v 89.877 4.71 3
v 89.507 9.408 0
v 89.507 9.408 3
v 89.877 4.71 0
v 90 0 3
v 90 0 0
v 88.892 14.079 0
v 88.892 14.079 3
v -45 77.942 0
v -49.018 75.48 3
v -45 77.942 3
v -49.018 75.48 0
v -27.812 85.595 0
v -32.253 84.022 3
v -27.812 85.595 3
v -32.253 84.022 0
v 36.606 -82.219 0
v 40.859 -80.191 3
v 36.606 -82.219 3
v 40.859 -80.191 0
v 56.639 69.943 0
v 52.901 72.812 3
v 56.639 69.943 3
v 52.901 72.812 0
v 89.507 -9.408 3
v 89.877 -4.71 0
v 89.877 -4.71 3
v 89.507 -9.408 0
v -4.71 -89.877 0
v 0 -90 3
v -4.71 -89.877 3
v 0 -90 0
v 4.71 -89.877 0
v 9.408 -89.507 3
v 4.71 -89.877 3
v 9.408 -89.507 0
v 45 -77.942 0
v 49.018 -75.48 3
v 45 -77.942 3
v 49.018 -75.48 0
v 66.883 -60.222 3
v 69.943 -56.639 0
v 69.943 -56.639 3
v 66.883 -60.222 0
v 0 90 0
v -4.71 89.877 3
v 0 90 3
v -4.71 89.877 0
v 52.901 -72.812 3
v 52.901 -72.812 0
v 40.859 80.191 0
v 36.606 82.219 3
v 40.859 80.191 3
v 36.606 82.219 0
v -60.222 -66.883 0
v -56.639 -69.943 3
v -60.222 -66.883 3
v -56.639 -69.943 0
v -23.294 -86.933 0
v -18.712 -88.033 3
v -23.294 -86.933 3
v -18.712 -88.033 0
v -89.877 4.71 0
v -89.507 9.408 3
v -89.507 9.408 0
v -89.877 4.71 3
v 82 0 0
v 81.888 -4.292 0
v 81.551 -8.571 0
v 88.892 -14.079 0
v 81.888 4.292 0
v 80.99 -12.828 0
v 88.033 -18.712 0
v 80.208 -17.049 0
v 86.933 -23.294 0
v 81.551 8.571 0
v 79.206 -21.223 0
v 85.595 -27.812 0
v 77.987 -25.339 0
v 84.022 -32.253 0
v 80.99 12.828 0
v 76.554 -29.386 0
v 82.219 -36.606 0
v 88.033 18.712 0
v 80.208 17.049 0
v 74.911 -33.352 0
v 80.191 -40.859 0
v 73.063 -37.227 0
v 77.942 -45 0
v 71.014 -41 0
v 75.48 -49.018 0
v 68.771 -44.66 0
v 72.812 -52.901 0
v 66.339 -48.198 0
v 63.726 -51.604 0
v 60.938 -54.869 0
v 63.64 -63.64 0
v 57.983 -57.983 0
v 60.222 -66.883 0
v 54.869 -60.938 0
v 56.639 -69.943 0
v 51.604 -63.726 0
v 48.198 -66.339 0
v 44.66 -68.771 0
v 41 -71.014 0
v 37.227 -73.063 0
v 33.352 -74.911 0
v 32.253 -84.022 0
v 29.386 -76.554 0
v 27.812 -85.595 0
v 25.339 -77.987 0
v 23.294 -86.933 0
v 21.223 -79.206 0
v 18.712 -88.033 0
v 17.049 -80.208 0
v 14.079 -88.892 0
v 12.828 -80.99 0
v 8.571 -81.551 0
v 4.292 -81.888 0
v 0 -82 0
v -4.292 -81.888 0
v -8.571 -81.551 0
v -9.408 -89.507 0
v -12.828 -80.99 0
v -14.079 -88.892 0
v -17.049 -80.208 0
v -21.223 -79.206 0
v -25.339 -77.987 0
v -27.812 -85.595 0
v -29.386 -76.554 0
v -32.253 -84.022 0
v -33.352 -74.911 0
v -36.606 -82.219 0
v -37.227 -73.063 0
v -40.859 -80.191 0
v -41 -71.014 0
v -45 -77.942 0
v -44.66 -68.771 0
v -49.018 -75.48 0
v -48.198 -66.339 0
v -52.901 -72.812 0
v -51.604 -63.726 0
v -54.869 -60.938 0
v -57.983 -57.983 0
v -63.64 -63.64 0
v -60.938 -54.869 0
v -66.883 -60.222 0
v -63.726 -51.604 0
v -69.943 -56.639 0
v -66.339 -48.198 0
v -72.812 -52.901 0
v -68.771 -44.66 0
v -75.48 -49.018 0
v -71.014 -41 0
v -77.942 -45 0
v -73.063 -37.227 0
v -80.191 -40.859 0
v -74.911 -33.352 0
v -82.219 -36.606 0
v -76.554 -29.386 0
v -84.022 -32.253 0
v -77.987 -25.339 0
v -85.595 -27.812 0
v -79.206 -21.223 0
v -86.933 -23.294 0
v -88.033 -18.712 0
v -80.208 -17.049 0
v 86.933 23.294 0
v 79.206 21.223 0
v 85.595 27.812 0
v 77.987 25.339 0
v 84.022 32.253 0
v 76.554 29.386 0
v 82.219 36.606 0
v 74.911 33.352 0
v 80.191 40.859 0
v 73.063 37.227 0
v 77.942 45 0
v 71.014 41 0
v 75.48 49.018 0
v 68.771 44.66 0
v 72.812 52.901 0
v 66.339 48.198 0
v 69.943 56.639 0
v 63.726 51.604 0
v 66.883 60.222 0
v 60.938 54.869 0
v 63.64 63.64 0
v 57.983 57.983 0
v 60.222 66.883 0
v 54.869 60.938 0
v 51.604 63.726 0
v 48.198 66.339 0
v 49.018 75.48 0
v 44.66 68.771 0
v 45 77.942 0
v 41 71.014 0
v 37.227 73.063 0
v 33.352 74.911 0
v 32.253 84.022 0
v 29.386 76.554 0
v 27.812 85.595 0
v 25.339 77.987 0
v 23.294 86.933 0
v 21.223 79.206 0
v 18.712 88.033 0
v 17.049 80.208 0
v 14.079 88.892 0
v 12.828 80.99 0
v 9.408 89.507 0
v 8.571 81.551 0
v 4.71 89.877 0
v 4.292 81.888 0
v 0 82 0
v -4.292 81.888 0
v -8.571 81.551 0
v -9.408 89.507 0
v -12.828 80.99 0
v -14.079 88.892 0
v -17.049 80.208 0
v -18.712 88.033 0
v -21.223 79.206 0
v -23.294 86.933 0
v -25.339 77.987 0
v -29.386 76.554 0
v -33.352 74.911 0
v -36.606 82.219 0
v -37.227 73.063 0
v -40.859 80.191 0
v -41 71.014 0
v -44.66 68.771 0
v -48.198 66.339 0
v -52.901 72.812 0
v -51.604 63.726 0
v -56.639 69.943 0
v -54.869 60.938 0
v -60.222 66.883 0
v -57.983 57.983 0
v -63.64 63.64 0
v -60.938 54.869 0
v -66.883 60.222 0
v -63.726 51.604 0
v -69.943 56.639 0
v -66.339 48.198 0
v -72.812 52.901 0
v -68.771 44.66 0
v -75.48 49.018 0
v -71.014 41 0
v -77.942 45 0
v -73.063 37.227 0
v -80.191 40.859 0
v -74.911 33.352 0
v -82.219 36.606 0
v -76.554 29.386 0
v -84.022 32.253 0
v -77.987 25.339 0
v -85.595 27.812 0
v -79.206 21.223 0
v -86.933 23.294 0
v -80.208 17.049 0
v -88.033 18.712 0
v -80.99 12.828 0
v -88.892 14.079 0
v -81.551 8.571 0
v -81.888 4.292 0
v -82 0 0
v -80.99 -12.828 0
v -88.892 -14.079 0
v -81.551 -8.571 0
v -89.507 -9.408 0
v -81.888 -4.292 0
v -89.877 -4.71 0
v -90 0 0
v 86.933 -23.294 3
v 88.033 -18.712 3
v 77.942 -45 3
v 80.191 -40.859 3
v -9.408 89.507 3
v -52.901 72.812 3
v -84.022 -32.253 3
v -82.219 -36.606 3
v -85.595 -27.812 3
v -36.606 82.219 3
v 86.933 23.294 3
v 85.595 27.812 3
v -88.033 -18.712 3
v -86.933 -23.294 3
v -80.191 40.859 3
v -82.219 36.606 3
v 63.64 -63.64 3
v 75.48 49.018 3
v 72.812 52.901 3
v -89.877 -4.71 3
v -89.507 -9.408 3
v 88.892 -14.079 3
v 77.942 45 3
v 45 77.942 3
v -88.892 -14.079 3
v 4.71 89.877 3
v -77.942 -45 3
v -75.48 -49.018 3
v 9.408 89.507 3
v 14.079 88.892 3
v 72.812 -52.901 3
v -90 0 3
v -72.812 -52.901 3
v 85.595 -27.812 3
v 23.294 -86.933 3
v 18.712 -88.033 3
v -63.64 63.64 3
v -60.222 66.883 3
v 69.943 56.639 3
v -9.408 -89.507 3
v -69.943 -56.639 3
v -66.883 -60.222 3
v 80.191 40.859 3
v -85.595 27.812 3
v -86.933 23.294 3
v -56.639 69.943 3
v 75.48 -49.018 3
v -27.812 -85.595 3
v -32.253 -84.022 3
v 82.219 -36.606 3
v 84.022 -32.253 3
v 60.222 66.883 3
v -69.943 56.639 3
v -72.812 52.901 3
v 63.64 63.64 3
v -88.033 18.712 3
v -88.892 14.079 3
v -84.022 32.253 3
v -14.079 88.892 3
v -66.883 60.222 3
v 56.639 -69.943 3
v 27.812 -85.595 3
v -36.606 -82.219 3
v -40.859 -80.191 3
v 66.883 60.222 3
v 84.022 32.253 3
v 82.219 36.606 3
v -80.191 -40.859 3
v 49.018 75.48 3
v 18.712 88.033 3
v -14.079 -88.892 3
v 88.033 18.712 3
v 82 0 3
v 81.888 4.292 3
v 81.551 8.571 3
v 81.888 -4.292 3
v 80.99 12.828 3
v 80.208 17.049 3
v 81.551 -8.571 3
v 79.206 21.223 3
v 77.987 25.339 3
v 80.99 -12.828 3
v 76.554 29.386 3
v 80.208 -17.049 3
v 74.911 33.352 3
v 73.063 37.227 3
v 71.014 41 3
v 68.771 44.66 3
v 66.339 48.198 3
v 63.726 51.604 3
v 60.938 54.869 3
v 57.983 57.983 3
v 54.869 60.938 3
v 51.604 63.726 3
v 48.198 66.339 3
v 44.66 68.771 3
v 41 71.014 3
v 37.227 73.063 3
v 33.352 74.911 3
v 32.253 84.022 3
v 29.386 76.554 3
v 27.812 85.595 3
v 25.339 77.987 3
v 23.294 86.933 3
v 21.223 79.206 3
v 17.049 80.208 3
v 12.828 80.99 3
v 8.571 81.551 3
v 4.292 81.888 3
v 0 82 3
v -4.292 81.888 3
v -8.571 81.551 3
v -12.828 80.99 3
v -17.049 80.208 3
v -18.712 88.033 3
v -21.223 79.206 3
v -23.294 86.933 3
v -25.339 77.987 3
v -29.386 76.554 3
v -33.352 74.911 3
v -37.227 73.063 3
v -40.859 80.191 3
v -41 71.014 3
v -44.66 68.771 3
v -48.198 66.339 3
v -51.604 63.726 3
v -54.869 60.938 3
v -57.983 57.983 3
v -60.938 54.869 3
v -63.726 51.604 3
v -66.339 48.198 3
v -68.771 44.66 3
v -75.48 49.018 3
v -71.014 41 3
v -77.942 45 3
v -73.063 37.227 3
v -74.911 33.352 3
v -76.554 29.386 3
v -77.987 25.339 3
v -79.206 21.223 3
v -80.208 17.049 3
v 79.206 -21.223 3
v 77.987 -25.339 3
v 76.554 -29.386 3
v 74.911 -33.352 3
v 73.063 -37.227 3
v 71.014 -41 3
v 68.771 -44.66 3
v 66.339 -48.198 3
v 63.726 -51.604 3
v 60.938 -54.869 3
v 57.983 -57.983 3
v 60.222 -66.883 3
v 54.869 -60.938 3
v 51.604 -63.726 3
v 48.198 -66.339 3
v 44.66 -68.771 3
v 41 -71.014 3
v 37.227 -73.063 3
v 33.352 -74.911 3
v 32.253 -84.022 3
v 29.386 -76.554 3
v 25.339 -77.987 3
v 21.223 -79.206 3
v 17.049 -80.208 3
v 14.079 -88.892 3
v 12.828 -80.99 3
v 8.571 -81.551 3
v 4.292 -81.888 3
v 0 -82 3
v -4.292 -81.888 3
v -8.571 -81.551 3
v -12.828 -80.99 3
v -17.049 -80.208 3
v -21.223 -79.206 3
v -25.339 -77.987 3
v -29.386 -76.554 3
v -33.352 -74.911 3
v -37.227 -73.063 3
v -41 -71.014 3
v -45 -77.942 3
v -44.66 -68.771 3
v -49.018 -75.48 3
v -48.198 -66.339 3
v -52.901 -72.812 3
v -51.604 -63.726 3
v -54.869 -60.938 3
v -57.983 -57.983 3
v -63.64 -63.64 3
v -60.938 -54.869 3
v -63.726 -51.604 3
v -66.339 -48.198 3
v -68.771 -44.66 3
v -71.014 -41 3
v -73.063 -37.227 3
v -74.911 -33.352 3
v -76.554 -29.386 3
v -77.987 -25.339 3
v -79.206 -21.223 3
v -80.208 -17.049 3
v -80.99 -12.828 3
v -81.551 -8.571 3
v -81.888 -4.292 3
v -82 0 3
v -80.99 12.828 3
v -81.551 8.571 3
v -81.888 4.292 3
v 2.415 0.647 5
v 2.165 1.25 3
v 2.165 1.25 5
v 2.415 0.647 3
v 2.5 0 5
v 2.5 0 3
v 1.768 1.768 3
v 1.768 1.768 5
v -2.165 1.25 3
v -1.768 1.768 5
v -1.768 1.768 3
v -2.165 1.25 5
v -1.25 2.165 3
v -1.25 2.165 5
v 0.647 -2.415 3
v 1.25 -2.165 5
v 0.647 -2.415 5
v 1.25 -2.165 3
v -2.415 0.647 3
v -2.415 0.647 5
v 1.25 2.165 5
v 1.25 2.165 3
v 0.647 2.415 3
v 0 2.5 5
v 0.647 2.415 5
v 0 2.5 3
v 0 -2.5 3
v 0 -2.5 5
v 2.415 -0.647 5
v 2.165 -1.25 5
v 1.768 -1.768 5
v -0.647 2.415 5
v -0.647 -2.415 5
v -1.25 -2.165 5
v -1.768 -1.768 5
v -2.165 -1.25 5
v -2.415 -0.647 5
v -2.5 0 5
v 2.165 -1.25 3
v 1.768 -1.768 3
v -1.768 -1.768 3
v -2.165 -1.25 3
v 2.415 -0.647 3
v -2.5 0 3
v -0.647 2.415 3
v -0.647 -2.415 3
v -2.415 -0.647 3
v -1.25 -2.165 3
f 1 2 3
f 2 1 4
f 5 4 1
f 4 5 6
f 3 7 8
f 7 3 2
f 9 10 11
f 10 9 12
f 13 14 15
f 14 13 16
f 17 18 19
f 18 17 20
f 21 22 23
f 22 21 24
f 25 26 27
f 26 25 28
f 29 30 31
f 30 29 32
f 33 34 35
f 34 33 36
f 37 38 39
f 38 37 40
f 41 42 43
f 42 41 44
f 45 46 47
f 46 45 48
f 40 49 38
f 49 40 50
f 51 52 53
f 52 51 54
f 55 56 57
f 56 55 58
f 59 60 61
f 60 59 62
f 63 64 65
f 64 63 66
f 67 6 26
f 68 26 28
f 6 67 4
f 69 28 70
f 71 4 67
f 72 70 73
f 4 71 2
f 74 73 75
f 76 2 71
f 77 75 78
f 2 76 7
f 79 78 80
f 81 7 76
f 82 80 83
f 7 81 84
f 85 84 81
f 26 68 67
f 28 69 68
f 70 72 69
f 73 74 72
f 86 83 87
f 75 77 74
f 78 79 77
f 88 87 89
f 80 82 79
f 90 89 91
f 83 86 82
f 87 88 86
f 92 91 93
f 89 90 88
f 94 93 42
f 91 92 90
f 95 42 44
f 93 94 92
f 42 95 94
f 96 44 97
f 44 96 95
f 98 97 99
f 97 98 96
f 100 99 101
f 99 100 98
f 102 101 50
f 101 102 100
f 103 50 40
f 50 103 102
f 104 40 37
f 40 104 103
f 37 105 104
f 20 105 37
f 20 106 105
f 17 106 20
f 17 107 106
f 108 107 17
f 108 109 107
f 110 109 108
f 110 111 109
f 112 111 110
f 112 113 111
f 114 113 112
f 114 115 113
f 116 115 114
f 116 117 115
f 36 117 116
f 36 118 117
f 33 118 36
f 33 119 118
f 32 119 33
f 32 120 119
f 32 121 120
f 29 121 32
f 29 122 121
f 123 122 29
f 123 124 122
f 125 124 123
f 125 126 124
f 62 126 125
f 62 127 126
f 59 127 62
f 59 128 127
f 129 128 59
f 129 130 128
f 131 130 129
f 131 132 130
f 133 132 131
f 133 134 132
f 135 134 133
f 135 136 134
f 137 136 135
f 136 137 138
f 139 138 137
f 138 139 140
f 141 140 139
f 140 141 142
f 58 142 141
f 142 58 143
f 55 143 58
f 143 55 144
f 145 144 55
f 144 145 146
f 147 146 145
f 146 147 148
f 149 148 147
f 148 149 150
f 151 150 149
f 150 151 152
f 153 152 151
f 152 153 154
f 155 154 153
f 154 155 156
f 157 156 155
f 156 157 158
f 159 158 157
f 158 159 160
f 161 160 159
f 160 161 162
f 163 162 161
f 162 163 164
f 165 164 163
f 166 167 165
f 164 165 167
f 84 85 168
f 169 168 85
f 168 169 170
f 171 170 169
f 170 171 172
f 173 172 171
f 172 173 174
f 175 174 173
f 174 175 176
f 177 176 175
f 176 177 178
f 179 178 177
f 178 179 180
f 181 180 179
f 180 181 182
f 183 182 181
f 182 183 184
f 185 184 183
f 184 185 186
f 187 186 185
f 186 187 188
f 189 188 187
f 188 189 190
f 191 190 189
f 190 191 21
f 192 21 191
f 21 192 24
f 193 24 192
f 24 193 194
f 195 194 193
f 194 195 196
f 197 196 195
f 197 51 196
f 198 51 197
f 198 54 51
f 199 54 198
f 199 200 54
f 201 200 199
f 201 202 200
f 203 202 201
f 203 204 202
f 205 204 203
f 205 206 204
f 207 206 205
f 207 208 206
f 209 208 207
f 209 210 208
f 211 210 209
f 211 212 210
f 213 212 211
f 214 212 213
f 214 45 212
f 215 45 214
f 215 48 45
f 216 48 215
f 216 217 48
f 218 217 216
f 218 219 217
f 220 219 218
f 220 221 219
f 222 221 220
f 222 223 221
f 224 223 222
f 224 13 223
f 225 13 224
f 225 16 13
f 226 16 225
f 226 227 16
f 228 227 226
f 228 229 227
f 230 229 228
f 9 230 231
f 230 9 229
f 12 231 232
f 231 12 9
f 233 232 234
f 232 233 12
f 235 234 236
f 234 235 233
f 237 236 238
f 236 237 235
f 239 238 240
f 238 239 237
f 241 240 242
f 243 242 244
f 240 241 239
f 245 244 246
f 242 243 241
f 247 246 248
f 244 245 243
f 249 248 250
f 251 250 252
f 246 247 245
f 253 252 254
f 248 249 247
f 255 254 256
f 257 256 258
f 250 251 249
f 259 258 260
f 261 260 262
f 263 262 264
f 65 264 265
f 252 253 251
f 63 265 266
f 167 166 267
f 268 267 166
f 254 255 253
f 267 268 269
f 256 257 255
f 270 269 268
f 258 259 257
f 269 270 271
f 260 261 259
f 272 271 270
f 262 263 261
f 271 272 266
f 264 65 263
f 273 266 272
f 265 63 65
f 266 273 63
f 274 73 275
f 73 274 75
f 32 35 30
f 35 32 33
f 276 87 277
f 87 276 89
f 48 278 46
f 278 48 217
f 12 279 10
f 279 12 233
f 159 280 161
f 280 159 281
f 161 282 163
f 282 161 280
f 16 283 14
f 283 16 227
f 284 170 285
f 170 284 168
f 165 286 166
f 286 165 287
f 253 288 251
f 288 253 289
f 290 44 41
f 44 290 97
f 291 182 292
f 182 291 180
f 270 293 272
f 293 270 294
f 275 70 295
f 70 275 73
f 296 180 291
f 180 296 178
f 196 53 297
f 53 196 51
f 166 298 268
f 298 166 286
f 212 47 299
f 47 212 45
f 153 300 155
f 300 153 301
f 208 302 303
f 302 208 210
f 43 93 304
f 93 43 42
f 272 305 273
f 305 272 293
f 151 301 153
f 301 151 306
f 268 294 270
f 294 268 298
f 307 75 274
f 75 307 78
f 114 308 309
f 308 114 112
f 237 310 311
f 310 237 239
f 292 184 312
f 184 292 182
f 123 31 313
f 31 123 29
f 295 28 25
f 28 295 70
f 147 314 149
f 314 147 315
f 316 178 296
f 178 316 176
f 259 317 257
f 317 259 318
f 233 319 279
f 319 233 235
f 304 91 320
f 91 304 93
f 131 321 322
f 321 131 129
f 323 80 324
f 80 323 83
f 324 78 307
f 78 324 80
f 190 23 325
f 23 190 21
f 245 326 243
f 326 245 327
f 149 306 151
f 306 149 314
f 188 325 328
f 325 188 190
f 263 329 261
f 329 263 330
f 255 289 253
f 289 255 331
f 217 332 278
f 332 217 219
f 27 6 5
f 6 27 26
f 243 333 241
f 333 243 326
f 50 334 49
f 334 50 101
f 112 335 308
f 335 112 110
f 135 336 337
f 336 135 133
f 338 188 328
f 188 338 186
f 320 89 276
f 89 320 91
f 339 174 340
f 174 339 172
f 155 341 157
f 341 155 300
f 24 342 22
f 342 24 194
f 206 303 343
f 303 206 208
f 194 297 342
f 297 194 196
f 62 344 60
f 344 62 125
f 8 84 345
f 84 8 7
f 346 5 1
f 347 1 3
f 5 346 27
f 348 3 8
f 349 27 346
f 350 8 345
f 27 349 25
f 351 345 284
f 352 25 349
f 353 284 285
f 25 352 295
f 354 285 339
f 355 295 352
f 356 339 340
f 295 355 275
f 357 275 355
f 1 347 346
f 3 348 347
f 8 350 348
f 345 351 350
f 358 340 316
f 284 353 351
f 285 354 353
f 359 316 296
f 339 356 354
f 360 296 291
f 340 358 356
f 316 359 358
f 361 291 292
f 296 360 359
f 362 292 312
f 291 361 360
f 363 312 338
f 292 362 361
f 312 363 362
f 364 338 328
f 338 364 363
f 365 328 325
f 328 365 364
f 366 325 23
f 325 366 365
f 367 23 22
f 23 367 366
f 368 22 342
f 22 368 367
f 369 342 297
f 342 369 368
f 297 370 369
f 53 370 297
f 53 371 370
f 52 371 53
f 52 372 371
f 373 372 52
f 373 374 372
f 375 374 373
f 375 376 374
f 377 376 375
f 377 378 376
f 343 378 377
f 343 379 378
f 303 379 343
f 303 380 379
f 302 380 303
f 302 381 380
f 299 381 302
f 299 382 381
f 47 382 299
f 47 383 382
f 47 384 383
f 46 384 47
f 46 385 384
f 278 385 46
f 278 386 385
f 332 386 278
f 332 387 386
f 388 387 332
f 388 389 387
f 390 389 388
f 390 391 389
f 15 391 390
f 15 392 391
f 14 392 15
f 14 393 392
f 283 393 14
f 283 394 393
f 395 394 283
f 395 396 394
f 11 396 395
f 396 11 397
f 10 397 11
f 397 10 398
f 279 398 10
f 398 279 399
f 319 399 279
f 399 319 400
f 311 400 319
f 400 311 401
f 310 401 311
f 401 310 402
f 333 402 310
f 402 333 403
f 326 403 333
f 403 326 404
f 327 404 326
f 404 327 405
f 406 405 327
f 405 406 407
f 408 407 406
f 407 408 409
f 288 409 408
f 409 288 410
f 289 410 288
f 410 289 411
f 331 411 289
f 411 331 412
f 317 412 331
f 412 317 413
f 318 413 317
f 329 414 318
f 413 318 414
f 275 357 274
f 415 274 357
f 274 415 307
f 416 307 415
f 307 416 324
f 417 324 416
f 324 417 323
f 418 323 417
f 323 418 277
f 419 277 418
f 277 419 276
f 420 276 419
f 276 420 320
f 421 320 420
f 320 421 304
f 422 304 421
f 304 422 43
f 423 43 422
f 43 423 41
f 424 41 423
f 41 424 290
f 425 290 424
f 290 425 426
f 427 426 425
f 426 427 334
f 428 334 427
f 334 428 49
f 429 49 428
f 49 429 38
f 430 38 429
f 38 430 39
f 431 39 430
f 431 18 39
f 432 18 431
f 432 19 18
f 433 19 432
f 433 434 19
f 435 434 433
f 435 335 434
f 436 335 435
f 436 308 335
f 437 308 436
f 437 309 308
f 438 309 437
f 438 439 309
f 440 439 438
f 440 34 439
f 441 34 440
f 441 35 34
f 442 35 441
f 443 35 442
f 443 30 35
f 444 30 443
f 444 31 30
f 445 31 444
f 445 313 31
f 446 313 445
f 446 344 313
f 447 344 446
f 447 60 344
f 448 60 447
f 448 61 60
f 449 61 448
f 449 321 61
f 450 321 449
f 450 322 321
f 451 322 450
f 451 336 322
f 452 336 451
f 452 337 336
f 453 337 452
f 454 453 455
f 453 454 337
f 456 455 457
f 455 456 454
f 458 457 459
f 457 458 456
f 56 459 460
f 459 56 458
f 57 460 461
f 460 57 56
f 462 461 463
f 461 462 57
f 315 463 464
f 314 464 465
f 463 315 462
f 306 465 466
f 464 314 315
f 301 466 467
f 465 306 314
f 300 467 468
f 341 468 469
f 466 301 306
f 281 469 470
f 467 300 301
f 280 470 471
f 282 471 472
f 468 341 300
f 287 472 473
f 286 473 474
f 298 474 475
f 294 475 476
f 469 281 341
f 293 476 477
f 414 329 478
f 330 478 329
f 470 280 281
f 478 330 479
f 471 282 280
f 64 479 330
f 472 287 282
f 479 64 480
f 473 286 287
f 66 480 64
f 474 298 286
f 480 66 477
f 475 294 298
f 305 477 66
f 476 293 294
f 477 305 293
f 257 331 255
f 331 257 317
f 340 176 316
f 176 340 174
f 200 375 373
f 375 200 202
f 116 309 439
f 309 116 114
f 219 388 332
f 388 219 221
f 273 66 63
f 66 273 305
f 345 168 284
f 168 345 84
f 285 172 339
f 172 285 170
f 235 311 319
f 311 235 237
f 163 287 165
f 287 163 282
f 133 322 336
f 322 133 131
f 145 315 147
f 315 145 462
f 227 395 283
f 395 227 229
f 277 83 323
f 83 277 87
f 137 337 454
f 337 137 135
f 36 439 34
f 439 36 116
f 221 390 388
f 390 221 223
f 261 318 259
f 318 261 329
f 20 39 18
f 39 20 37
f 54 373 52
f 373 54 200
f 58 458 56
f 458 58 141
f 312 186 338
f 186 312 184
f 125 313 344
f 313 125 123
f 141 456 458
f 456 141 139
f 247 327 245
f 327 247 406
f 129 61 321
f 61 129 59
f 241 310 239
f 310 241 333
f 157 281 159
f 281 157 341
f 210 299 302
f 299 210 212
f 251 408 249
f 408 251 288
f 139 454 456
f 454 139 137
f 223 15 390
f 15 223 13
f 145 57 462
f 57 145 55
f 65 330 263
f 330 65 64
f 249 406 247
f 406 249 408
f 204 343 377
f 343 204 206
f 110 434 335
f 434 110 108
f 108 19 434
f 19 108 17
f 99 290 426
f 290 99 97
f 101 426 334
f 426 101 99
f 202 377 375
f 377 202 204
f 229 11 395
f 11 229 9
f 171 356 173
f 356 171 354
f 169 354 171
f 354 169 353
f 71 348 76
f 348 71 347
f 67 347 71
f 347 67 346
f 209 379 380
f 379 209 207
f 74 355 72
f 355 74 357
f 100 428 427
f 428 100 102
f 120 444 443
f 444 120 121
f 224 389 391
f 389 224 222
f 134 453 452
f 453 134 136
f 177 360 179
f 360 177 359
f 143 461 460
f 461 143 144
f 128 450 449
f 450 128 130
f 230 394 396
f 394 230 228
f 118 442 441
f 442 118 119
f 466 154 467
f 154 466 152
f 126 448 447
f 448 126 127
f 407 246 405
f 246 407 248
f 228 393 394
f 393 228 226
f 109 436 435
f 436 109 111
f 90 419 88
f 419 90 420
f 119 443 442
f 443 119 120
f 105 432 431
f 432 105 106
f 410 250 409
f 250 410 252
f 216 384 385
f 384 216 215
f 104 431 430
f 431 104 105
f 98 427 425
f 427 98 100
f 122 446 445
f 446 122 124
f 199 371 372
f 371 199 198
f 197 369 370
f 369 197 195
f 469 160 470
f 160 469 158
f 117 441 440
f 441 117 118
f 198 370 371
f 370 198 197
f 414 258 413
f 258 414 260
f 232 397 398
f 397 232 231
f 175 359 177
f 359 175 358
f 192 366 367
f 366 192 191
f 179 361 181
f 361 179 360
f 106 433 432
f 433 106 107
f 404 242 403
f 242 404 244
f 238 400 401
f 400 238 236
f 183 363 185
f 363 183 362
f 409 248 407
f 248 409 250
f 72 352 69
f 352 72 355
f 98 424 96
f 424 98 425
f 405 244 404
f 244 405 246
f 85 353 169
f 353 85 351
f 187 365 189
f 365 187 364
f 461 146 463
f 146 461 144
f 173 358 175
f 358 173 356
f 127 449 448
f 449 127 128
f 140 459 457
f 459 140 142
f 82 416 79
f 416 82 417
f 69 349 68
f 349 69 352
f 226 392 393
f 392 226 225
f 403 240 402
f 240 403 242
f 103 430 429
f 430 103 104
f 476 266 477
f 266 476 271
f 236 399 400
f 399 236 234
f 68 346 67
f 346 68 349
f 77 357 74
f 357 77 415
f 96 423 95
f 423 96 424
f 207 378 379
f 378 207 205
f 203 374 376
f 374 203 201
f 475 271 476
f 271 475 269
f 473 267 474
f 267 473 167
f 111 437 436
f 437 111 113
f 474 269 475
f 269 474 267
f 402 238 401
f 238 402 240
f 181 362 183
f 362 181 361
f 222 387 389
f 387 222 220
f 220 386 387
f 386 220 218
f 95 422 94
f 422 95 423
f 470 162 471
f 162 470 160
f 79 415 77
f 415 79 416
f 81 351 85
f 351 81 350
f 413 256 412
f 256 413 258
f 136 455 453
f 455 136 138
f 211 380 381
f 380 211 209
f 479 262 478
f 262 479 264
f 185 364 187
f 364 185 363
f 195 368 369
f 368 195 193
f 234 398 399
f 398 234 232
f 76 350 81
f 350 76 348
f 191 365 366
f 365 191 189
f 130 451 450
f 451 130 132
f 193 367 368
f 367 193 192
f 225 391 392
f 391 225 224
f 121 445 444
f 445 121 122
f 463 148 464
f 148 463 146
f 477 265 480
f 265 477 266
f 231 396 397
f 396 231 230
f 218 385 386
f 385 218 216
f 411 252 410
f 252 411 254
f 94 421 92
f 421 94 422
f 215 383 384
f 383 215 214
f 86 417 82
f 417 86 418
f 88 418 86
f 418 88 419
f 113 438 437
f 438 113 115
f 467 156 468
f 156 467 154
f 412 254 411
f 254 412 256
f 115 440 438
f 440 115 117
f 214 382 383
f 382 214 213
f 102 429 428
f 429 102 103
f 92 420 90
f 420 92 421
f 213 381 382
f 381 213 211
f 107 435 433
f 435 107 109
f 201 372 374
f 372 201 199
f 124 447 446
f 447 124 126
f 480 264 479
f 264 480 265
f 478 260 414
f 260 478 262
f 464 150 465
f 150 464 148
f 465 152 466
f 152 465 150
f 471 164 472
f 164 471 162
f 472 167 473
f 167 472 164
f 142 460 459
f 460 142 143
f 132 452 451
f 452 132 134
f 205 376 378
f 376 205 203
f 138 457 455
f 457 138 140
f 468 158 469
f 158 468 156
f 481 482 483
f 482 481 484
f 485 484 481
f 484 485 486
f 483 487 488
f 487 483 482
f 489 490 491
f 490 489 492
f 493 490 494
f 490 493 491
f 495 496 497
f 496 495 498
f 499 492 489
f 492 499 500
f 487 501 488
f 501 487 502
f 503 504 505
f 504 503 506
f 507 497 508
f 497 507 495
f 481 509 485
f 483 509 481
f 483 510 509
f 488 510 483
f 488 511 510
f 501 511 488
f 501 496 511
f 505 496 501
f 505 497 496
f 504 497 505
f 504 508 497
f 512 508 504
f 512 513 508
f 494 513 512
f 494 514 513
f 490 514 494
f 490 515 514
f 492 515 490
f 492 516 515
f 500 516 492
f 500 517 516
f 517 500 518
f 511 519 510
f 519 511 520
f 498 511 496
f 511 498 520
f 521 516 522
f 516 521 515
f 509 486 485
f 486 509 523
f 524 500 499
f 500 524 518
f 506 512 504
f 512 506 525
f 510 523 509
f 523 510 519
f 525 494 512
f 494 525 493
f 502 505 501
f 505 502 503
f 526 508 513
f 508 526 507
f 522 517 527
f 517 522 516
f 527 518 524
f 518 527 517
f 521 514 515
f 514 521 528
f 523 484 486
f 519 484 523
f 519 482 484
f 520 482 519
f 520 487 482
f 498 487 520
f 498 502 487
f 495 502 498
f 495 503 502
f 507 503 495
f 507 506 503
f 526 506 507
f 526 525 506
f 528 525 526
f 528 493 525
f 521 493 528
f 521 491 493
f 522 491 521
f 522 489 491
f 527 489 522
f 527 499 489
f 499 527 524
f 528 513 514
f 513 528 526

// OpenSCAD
// file: ../common/ticks.scad
// =============================================================================
// ticks.scad — Tick mark and angle arc modules for PhysicsSCAD
// =============================================================================
// Reusable tick mark sets and arc indicators for graphs, rulers, protractors,
// and other measurement references in physics educational models.
//
// Usage:
//   include <../common/ticks.scad>;
//
// Modules:
//   tick_marks_linear    — evenly spaced ticks along the x-axis
//   numbered_tick_marks  — ticks with small numeric text labels
//   radial_ticks         — tick marks distributed around a circle
//   angle_arc            — filled arc sector showing an angle
// =============================================================================

// -----------------------------------------------------------------------------
// tick_marks_linear
// Row of evenly spaced tick marks along the positive X axis, centred in Y.
//
// Parameters:
//   length     — total span along x (mm)
//   spacing    — distance between tick centres (mm)
//   tick_length — full tick height in Y (mm)
//   tick_width — tick bar width in X (mm)
//   thickness  — extrusion depth in Z (mm)
// -----------------------------------------------------------------------------
module tick_marks_linear(
  length      = 60,
  spacing     = 10,
  tick_length = 4,
  tick_width  = 1.2,
  thickness   = 2
) {
  count = floor(length / spacing);

  linear_extrude(height = thickness) {
    for (i = [0 : count]) {
      translate([i * spacing - tick_width / 2, -tick_length / 2])
        square([tick_width, tick_length]);
    }
  }
}

// -----------------------------------------------------------------------------
// numbered_tick_marks
// Tick marks with raised numeric labels beneath each tick.
//
// Parameters:
//   count       — number of ticks (intervals = count - 1)
//   spacing     — distance between ticks (mm)
//   tick_length — tick bar height (mm)
//   tick_width  — tick bar width (mm)
//   number_size — text character height (mm)
//   thickness   — extrusion depth in Z (mm)
// -----------------------------------------------------------------------------
module numbered_tick_marks(
  count       = 6,
  spacing     = 10,
  tick_length = 4,
  tick_width  = 1.2,
  number_size = 3,
  thickness   = 2
) {
  linear_extrude(height = thickness) {
    for (i = [0 : count - 1]) {
      x = i * spacing;

      // Tick bar
      translate([x - tick_width / 2, 0])
        square([tick_width, tick_length]);

      // Numeric label below the tick
      translate([x, -(number_size * 1.8)])
        text(str(i), size = number_size, halign = "center", valign = "top",
             font = "Liberation Sans");
    }
  }
}

// -----------------------------------------------------------------------------
// radial_ticks
// Tick marks equally spaced around a full circle (like a protractor or clock).
// Each tick points outward from the given radius.
//
// Parameters:
//   radius      — radial distance to the inner end of each tick (mm)
//   spacing_deg — angular spacing between ticks (degrees)
//   tick_length — radial length of each tick bar (mm)
//   tick_width  — circumferential width of each tick bar (mm)
//   thickness   — extrusion depth in Z (mm)
// -----------------------------------------------------------------------------
module radial_ticks(
  radius      = 30,
  spacing_deg = 15,
  tick_length = 3,
  tick_width  = 1.2,
  thickness   = 2
) {
  count = floor(360 / spacing_deg);

  linear_extrude(height = thickness) {
    for (i = [0 : count - 1]) {
      rotate([0, 0, i * spacing_deg])
        translate([radius, -tick_width / 2])
          square([tick_length, tick_width]);
    }
  }
}

// -----------------------------------------------------------------------------
// angle_arc
// Filled arc sector (pie-slice) from 0° to angle_deg, useful as an angle
// indicator or background for angle labels.
//
// Parameters:
//   radius    — outer radius of the arc sector (mm)
//   angle_deg — sweep angle (degrees)
//   shaft_width — radial thickness of the arc ring (0 = filled sector) (mm)
//   thickness — extrusion depth in Z (mm)
// -----------------------------------------------------------------------------
module angle_arc(
  radius      = 20,
  angle_deg   = 45,
  shaft_width = 1.5,
  thickness   = 2
) {
  r_outer = radius;
  r_inner = max(0, radius - shaft_width);

  // Build arc as a polygon approximation
  resolution = max(3, floor(64 * angle_deg / 360));

  linear_extrude(height = thickness) {
    difference() {
      // Outer sector
      intersection() {
        circle(r = r_outer, $fn = 64);
        polygon(points = concat(
          [[0, 0]],
          [for (i = [0 : resolution])
            let(a = i * angle_deg / resolution)
            [r_outer * cos(a), r_outer * sin(a)]]
        ));
      }
      // Inner cutout to make a ring arc (skip if shaft_width covers full radius)
      if (r_inner > 0)
        circle(r = r_inner, $fn = 64);
    }
  }
}
// main file
/*
Title: Pendulum Geometry Guide
Folder: 16_oscillations_shm
Physics Topic: Pendulum angle and arc geometry
Difficulty: Beginner-Intermediate
Print Type: FDM, single material
Teaches: Conceptual mechanics
Use Case: Classroom manipulative
*/


use <../common/ticks.scad>;
// --------------------
// Parameters
// --------------------
radius = 90;
plate_t = 3;

module pendulum_guide(){
    difference(){
        cylinder(h=plate_t,r=radius,$fn=120);
        cylinder(h=plate_t+0.1,r=radius-8,$fn=120);
    }
    radial_ticks(radius=radius-4,spacing_deg=10,tick_len=4);
    translate([0,0,plate_t]) cylinder(h=2,d=5,$fn=24);
}
pendulum_guide();
